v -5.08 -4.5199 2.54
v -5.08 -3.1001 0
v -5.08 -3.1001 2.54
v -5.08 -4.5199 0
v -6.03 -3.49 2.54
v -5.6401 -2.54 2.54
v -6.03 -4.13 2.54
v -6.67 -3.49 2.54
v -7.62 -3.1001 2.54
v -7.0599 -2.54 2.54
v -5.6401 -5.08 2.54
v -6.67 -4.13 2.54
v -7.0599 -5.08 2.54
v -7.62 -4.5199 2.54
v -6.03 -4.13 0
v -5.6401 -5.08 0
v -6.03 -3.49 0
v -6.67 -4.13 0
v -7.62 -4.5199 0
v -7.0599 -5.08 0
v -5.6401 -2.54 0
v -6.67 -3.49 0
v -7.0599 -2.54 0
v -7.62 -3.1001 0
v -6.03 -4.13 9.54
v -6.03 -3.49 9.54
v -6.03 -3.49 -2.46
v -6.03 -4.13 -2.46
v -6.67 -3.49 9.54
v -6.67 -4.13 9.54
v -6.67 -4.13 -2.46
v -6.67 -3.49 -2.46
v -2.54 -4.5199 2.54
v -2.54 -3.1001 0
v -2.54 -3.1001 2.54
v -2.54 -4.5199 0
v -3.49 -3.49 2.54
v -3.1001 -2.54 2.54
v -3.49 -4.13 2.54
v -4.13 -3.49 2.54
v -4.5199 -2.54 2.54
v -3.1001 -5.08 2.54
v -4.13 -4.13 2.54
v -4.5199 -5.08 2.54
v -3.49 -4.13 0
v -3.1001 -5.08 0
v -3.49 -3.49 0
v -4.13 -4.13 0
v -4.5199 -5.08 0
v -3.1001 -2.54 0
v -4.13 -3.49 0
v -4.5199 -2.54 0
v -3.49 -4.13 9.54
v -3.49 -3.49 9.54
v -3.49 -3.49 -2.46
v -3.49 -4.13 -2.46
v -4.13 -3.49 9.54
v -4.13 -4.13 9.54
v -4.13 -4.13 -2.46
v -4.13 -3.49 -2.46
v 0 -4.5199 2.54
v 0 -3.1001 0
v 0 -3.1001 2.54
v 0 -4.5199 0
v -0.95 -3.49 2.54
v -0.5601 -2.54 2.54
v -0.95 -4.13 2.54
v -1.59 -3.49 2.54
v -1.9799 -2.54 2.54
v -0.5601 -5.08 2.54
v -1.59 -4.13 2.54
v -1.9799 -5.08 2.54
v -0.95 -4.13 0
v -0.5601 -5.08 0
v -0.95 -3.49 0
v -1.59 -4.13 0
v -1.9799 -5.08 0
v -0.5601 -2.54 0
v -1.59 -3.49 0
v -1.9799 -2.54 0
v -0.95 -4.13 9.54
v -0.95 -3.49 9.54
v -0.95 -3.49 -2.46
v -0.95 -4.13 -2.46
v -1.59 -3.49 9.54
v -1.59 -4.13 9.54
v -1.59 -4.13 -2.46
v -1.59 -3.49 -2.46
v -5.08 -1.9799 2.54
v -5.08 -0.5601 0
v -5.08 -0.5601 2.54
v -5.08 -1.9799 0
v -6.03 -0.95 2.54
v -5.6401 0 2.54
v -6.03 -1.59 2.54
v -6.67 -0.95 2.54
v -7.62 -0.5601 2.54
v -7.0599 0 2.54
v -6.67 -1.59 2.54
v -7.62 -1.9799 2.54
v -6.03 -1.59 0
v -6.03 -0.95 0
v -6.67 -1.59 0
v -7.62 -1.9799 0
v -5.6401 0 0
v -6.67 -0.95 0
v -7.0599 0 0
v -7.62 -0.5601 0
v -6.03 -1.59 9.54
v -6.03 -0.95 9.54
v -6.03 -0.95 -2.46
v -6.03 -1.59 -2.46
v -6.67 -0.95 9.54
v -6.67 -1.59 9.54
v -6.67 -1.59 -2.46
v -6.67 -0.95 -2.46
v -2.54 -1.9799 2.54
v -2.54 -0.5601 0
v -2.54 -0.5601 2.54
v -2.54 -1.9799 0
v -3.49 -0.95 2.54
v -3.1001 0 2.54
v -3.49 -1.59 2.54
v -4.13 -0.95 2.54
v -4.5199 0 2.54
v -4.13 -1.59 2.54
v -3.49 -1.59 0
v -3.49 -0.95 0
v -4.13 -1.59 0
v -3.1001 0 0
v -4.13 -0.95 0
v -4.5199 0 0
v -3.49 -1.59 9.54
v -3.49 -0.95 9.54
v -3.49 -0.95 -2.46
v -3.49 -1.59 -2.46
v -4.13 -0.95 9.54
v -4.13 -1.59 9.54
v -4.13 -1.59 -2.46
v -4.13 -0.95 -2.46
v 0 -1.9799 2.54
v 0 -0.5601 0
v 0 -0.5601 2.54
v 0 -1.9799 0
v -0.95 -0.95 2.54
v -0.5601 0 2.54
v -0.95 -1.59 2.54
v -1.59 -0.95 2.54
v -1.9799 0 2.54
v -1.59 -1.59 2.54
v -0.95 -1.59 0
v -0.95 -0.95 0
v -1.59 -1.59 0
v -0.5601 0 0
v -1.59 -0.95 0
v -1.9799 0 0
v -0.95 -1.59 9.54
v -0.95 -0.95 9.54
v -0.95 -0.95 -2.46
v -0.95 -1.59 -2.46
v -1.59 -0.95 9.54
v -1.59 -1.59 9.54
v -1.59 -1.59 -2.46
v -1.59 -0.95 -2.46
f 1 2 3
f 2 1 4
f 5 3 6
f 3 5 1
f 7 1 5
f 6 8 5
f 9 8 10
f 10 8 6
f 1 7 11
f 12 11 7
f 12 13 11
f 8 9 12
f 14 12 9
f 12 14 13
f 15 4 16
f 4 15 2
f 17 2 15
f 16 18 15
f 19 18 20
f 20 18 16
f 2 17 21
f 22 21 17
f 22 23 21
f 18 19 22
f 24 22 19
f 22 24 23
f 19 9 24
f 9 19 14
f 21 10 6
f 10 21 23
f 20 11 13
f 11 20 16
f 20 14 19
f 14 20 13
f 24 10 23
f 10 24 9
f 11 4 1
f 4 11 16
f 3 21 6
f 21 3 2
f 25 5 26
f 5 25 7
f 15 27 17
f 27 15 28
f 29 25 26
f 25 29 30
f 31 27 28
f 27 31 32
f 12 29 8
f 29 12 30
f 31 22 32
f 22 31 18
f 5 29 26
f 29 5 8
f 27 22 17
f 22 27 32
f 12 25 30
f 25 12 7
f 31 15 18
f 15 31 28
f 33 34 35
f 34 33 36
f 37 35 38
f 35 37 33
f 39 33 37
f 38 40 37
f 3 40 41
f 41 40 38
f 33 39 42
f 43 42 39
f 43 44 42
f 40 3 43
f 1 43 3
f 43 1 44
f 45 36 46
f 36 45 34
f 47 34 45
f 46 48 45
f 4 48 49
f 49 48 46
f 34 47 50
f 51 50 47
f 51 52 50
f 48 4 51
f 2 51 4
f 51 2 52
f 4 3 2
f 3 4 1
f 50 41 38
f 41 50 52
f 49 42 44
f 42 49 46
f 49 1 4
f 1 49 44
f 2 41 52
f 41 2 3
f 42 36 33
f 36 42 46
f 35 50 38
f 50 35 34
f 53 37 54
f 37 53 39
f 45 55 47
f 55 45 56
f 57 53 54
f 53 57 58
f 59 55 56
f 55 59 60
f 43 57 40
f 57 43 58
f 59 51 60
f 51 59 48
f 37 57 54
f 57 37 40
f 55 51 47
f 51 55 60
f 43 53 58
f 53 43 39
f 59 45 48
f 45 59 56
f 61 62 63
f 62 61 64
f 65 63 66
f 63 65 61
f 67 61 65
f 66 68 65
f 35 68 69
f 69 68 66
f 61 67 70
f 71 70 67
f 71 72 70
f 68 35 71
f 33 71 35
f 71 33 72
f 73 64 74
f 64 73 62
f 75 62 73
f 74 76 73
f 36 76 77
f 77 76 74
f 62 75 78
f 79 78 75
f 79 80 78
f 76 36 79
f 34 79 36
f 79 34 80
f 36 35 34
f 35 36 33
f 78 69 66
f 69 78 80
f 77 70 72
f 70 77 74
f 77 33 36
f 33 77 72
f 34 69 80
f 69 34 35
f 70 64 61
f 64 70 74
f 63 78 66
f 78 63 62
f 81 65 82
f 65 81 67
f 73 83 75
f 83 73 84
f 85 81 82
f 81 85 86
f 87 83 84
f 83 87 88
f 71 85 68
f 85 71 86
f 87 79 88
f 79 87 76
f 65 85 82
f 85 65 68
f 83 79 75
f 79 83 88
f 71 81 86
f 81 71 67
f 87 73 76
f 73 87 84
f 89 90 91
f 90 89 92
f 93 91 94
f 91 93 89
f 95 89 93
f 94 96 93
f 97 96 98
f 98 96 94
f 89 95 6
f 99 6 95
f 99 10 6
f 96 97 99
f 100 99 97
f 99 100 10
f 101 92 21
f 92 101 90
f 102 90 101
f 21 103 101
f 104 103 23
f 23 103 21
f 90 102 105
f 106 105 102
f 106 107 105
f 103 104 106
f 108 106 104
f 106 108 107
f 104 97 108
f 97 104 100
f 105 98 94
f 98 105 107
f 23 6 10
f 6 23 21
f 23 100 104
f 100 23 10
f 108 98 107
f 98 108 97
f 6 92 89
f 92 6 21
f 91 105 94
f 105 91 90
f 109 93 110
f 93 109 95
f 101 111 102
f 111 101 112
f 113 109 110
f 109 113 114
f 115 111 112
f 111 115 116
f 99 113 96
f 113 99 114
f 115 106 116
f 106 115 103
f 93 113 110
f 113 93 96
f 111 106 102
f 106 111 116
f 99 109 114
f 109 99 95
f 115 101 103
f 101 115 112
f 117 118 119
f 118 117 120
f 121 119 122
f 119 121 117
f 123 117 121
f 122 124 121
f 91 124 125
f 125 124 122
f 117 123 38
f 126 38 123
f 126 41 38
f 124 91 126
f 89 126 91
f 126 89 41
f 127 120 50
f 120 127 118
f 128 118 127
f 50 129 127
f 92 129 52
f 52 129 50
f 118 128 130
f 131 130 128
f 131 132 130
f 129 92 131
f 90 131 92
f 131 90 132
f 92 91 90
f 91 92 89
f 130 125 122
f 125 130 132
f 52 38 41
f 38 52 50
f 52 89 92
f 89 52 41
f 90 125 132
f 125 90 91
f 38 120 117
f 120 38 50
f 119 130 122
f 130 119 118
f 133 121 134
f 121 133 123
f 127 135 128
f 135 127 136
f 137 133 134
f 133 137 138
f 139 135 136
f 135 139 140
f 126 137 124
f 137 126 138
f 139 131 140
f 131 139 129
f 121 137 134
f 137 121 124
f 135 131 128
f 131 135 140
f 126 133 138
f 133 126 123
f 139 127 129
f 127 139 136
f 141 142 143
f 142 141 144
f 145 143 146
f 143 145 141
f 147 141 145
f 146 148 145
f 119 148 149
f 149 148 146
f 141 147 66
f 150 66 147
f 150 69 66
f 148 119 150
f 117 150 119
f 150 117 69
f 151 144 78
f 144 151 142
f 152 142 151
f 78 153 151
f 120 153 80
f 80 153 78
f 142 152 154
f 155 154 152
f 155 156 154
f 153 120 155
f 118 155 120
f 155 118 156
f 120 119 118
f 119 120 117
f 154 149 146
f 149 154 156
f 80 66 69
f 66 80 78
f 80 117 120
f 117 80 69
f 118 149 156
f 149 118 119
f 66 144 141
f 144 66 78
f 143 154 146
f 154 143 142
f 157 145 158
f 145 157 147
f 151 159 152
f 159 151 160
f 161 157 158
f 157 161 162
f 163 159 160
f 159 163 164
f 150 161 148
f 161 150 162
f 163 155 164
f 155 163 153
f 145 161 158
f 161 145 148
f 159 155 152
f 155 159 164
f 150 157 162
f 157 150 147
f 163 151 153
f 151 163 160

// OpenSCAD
// pin_headers.scad
//
// Model of through-hole pin headers.
//
// Units are metric
//
// "height" is the total length of the pin. Default is 12mm.
// "upper" is the length of the pin above the stopper. Default is 7mm.
// "rows" is the number of rows. Default is 3.
// "cols" is the number of columns. Default is 2.
//
// Examples:
// pin_header( 12, 7, 2, 5);
// pin_header( rows=5 cols=1 );
// By Paul McGovern

module off_pin_header(height=12, upper=7, rows=3, cols=2) {
cl = 2.54;
translate( [ -(rows * cl/2 ), -(cols * cl/2 ), 0 ] )
pin_header(height, upper, rows,cols);
}

module pin_header( height=12, upper=7, rows=3, cols=2 ) {

        cl = 2.54;

        translate( [ -(rows * cl/2 ) + cl /2, -(cols * cl/2 ) + cl /2, 0 ] ) {

                for( col = [0: cols -1 ] ) {
                        for( row = [0 : rows -1 ] ) {

                                translate( [ cl * row , cl * col, 0] ) {
        
                                        color( "gray" )
                                                translate( [0,0, cl / 2]) {
                                                        intersection() {
                                                                cube( [ cl, cl, cl ], center=true );
                                                                rotate( [0, 0, 45] ) cube( [ 2.8, 2.8, cl ], center=true );
                                                }
                                }

                                color( "gold" ) {
                                        translate( [0,0, (upper - ( height/2 )) + cl ] ) {
                                                union() {
                                                        cube( [0.64,0.64,height], center=true );
                                                        translate( [0,0, height/2 ] ) scale( 0.64 ) _pin_point();
                                                        translate( [0,0, -height/2 ] ) scale( 0.64 )        rotate([180,0,0] )_pin_point();
                                                }
                                        }
                                }
                        }
                }
        }
}
}

module _pin_point() {
        translate( [-0.5,-0.5, 0])
                polyhedron(
                        points=[[0,0,0],[0,1,0],[1,1,0],[1,0,0],[0.5,0.5,0.5]],
                        triangles=[[0,1,2],[0,2,3],[0,1,4],[1,2,4],[2,3,4],[3,0,4]]);
}

off_pin_header();
%pin_header();
